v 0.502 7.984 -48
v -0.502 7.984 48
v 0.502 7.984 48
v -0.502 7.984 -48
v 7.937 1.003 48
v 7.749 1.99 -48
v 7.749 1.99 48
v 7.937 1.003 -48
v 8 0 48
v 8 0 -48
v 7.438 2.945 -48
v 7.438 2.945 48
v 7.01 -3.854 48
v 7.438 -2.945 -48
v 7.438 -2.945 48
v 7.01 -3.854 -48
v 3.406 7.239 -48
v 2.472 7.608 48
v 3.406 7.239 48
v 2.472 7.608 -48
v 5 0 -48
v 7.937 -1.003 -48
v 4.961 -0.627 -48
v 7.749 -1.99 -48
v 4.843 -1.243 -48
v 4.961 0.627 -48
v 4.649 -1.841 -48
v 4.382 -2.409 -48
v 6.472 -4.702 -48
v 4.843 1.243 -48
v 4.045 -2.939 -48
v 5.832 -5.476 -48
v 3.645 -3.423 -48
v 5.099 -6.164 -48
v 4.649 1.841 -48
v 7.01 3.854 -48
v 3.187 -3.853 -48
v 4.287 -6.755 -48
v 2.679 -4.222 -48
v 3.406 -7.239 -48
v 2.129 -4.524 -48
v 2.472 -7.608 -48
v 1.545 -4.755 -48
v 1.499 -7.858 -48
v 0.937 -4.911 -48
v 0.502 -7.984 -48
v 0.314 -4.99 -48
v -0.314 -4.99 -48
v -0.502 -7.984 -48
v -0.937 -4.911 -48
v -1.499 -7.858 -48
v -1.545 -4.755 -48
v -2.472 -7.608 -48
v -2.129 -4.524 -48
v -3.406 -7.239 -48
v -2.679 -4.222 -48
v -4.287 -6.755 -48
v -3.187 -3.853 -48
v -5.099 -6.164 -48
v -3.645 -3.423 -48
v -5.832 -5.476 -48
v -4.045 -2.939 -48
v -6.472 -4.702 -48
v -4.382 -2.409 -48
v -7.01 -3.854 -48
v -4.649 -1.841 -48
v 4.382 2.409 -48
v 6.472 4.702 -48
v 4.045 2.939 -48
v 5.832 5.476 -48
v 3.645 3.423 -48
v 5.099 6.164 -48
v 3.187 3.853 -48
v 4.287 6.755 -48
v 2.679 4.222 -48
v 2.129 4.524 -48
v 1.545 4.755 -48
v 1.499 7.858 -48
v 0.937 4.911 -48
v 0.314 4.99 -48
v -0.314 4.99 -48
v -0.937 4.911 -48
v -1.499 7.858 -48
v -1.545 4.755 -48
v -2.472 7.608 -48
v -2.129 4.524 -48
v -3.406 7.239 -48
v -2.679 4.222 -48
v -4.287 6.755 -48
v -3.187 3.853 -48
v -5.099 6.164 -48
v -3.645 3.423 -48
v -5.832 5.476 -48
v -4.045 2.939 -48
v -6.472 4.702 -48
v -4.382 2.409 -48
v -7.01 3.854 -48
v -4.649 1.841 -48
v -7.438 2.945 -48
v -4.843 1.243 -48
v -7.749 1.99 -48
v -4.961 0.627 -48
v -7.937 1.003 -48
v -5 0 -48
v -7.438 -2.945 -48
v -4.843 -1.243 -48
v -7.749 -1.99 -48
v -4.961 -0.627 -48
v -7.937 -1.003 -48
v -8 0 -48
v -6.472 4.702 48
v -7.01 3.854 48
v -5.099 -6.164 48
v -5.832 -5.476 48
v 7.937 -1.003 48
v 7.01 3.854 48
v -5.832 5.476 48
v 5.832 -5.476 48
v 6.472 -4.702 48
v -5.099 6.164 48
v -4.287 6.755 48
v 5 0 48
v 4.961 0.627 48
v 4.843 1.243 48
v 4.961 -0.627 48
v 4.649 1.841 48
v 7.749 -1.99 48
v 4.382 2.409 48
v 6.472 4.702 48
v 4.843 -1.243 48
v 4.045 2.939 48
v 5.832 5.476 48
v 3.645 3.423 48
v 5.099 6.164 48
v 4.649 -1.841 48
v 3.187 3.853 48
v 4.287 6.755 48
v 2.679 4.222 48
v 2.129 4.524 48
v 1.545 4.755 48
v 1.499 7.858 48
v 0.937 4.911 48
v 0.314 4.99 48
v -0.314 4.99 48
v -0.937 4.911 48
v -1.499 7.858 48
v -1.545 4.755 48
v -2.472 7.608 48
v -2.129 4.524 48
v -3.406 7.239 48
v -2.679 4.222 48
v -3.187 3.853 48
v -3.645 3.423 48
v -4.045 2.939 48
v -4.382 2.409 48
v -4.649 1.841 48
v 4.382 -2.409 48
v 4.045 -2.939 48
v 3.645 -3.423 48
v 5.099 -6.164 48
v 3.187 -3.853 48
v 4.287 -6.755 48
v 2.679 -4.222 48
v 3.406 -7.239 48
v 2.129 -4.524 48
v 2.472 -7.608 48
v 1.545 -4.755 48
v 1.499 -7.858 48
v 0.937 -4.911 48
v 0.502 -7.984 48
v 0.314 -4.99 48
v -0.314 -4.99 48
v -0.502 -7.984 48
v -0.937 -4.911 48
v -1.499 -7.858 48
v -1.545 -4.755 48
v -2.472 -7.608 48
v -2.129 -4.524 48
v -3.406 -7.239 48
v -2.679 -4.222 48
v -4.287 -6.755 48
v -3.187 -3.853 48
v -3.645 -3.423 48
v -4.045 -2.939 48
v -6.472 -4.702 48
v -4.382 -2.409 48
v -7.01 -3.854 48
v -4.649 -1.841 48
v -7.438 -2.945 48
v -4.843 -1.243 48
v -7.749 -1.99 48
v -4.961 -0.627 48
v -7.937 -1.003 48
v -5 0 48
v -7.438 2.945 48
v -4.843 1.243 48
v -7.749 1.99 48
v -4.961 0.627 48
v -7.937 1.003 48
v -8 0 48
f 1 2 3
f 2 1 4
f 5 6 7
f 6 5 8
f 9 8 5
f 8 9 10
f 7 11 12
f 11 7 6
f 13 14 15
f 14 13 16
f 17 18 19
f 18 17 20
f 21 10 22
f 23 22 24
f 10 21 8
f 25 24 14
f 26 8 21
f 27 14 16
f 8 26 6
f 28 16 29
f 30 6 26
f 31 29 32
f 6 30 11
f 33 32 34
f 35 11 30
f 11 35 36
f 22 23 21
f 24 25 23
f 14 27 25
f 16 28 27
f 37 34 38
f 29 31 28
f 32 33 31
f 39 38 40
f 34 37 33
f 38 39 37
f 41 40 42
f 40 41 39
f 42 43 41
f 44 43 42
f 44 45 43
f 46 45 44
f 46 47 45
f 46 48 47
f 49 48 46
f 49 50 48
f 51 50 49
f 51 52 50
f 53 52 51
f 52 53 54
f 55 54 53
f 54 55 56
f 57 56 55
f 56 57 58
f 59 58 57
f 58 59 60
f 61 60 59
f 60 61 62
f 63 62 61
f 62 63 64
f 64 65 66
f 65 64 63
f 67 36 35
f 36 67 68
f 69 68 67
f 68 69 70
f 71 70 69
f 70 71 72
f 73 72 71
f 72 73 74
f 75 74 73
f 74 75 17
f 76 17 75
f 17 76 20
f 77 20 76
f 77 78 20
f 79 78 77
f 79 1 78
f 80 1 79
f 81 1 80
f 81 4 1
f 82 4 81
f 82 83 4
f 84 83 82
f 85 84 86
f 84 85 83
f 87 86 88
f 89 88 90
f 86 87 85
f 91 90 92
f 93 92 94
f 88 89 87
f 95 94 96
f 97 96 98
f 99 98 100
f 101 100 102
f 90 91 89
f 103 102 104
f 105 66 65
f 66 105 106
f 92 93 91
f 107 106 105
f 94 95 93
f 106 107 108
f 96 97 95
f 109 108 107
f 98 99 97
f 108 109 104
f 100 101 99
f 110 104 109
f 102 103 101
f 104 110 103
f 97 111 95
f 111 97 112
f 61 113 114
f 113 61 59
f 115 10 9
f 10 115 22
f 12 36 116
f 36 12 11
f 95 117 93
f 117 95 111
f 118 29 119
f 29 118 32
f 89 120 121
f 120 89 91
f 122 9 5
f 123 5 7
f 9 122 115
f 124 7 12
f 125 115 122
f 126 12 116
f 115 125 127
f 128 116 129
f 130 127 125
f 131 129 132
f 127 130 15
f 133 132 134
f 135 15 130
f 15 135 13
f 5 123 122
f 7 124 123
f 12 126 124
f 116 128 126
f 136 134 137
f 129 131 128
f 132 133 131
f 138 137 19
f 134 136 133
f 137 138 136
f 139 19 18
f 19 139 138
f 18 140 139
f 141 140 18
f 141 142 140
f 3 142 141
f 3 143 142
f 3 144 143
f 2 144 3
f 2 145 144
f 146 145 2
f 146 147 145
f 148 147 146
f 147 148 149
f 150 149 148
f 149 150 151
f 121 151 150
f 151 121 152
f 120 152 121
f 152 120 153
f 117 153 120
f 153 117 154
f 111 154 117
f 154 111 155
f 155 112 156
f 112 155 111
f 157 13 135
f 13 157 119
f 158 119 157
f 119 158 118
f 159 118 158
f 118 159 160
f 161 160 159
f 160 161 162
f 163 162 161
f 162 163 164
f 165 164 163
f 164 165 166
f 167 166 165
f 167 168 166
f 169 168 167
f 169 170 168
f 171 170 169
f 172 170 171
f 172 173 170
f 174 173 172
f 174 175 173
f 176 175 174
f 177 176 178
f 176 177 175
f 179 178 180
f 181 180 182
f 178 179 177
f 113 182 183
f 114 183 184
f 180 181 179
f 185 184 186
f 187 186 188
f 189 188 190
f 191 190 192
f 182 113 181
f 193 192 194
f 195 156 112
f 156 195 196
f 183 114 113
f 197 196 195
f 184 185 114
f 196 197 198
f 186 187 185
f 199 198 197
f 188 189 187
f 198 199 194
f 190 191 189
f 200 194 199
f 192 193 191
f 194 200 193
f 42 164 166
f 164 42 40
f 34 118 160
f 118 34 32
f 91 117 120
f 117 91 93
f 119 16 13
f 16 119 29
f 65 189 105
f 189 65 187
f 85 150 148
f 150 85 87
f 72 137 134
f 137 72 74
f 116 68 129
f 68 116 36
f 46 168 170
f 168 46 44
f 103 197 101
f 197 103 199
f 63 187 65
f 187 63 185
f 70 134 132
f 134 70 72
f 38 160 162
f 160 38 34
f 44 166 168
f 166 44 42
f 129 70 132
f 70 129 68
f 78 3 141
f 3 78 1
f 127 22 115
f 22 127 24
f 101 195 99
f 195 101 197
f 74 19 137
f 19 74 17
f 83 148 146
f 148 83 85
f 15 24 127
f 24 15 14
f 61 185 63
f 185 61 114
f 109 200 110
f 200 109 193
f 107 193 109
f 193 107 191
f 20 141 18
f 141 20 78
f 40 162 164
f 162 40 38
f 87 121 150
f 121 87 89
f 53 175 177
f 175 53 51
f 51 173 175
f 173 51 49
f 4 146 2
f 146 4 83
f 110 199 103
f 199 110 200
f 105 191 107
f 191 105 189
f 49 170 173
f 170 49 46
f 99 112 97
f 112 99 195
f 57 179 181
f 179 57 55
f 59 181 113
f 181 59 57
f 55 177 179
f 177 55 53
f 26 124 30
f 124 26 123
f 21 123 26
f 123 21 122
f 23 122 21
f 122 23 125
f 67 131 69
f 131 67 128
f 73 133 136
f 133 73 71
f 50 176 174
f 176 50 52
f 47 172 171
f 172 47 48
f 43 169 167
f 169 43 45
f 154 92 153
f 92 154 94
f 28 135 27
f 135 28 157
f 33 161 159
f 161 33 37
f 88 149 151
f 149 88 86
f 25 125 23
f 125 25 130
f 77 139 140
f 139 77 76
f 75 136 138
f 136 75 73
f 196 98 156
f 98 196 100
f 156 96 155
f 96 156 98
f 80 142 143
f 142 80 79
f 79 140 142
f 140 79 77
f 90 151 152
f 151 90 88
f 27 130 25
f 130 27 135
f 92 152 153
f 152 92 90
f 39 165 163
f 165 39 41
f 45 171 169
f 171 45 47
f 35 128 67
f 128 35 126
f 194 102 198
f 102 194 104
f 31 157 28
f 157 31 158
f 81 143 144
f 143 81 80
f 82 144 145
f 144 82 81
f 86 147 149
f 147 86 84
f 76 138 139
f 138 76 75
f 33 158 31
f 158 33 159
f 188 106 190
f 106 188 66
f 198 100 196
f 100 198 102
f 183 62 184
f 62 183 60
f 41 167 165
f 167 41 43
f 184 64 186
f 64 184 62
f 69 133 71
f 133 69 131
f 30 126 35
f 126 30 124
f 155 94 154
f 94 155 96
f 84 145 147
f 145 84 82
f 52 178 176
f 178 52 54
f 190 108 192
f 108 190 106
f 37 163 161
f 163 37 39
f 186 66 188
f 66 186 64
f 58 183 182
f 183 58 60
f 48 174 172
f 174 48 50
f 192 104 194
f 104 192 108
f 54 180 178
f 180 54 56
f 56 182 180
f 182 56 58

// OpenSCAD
$fn = 50;


difference() {
	union() {
		translate(v = [0, 0, -48.0000000000]) {
			cylinder(h = 96, r = 8.0000000000);
		}
	}
	union() {
		translate(v = [0, 0, -100.0000000000]) {
			cylinder(h = 200, r = 5.0000000000);
		}
	}
}
